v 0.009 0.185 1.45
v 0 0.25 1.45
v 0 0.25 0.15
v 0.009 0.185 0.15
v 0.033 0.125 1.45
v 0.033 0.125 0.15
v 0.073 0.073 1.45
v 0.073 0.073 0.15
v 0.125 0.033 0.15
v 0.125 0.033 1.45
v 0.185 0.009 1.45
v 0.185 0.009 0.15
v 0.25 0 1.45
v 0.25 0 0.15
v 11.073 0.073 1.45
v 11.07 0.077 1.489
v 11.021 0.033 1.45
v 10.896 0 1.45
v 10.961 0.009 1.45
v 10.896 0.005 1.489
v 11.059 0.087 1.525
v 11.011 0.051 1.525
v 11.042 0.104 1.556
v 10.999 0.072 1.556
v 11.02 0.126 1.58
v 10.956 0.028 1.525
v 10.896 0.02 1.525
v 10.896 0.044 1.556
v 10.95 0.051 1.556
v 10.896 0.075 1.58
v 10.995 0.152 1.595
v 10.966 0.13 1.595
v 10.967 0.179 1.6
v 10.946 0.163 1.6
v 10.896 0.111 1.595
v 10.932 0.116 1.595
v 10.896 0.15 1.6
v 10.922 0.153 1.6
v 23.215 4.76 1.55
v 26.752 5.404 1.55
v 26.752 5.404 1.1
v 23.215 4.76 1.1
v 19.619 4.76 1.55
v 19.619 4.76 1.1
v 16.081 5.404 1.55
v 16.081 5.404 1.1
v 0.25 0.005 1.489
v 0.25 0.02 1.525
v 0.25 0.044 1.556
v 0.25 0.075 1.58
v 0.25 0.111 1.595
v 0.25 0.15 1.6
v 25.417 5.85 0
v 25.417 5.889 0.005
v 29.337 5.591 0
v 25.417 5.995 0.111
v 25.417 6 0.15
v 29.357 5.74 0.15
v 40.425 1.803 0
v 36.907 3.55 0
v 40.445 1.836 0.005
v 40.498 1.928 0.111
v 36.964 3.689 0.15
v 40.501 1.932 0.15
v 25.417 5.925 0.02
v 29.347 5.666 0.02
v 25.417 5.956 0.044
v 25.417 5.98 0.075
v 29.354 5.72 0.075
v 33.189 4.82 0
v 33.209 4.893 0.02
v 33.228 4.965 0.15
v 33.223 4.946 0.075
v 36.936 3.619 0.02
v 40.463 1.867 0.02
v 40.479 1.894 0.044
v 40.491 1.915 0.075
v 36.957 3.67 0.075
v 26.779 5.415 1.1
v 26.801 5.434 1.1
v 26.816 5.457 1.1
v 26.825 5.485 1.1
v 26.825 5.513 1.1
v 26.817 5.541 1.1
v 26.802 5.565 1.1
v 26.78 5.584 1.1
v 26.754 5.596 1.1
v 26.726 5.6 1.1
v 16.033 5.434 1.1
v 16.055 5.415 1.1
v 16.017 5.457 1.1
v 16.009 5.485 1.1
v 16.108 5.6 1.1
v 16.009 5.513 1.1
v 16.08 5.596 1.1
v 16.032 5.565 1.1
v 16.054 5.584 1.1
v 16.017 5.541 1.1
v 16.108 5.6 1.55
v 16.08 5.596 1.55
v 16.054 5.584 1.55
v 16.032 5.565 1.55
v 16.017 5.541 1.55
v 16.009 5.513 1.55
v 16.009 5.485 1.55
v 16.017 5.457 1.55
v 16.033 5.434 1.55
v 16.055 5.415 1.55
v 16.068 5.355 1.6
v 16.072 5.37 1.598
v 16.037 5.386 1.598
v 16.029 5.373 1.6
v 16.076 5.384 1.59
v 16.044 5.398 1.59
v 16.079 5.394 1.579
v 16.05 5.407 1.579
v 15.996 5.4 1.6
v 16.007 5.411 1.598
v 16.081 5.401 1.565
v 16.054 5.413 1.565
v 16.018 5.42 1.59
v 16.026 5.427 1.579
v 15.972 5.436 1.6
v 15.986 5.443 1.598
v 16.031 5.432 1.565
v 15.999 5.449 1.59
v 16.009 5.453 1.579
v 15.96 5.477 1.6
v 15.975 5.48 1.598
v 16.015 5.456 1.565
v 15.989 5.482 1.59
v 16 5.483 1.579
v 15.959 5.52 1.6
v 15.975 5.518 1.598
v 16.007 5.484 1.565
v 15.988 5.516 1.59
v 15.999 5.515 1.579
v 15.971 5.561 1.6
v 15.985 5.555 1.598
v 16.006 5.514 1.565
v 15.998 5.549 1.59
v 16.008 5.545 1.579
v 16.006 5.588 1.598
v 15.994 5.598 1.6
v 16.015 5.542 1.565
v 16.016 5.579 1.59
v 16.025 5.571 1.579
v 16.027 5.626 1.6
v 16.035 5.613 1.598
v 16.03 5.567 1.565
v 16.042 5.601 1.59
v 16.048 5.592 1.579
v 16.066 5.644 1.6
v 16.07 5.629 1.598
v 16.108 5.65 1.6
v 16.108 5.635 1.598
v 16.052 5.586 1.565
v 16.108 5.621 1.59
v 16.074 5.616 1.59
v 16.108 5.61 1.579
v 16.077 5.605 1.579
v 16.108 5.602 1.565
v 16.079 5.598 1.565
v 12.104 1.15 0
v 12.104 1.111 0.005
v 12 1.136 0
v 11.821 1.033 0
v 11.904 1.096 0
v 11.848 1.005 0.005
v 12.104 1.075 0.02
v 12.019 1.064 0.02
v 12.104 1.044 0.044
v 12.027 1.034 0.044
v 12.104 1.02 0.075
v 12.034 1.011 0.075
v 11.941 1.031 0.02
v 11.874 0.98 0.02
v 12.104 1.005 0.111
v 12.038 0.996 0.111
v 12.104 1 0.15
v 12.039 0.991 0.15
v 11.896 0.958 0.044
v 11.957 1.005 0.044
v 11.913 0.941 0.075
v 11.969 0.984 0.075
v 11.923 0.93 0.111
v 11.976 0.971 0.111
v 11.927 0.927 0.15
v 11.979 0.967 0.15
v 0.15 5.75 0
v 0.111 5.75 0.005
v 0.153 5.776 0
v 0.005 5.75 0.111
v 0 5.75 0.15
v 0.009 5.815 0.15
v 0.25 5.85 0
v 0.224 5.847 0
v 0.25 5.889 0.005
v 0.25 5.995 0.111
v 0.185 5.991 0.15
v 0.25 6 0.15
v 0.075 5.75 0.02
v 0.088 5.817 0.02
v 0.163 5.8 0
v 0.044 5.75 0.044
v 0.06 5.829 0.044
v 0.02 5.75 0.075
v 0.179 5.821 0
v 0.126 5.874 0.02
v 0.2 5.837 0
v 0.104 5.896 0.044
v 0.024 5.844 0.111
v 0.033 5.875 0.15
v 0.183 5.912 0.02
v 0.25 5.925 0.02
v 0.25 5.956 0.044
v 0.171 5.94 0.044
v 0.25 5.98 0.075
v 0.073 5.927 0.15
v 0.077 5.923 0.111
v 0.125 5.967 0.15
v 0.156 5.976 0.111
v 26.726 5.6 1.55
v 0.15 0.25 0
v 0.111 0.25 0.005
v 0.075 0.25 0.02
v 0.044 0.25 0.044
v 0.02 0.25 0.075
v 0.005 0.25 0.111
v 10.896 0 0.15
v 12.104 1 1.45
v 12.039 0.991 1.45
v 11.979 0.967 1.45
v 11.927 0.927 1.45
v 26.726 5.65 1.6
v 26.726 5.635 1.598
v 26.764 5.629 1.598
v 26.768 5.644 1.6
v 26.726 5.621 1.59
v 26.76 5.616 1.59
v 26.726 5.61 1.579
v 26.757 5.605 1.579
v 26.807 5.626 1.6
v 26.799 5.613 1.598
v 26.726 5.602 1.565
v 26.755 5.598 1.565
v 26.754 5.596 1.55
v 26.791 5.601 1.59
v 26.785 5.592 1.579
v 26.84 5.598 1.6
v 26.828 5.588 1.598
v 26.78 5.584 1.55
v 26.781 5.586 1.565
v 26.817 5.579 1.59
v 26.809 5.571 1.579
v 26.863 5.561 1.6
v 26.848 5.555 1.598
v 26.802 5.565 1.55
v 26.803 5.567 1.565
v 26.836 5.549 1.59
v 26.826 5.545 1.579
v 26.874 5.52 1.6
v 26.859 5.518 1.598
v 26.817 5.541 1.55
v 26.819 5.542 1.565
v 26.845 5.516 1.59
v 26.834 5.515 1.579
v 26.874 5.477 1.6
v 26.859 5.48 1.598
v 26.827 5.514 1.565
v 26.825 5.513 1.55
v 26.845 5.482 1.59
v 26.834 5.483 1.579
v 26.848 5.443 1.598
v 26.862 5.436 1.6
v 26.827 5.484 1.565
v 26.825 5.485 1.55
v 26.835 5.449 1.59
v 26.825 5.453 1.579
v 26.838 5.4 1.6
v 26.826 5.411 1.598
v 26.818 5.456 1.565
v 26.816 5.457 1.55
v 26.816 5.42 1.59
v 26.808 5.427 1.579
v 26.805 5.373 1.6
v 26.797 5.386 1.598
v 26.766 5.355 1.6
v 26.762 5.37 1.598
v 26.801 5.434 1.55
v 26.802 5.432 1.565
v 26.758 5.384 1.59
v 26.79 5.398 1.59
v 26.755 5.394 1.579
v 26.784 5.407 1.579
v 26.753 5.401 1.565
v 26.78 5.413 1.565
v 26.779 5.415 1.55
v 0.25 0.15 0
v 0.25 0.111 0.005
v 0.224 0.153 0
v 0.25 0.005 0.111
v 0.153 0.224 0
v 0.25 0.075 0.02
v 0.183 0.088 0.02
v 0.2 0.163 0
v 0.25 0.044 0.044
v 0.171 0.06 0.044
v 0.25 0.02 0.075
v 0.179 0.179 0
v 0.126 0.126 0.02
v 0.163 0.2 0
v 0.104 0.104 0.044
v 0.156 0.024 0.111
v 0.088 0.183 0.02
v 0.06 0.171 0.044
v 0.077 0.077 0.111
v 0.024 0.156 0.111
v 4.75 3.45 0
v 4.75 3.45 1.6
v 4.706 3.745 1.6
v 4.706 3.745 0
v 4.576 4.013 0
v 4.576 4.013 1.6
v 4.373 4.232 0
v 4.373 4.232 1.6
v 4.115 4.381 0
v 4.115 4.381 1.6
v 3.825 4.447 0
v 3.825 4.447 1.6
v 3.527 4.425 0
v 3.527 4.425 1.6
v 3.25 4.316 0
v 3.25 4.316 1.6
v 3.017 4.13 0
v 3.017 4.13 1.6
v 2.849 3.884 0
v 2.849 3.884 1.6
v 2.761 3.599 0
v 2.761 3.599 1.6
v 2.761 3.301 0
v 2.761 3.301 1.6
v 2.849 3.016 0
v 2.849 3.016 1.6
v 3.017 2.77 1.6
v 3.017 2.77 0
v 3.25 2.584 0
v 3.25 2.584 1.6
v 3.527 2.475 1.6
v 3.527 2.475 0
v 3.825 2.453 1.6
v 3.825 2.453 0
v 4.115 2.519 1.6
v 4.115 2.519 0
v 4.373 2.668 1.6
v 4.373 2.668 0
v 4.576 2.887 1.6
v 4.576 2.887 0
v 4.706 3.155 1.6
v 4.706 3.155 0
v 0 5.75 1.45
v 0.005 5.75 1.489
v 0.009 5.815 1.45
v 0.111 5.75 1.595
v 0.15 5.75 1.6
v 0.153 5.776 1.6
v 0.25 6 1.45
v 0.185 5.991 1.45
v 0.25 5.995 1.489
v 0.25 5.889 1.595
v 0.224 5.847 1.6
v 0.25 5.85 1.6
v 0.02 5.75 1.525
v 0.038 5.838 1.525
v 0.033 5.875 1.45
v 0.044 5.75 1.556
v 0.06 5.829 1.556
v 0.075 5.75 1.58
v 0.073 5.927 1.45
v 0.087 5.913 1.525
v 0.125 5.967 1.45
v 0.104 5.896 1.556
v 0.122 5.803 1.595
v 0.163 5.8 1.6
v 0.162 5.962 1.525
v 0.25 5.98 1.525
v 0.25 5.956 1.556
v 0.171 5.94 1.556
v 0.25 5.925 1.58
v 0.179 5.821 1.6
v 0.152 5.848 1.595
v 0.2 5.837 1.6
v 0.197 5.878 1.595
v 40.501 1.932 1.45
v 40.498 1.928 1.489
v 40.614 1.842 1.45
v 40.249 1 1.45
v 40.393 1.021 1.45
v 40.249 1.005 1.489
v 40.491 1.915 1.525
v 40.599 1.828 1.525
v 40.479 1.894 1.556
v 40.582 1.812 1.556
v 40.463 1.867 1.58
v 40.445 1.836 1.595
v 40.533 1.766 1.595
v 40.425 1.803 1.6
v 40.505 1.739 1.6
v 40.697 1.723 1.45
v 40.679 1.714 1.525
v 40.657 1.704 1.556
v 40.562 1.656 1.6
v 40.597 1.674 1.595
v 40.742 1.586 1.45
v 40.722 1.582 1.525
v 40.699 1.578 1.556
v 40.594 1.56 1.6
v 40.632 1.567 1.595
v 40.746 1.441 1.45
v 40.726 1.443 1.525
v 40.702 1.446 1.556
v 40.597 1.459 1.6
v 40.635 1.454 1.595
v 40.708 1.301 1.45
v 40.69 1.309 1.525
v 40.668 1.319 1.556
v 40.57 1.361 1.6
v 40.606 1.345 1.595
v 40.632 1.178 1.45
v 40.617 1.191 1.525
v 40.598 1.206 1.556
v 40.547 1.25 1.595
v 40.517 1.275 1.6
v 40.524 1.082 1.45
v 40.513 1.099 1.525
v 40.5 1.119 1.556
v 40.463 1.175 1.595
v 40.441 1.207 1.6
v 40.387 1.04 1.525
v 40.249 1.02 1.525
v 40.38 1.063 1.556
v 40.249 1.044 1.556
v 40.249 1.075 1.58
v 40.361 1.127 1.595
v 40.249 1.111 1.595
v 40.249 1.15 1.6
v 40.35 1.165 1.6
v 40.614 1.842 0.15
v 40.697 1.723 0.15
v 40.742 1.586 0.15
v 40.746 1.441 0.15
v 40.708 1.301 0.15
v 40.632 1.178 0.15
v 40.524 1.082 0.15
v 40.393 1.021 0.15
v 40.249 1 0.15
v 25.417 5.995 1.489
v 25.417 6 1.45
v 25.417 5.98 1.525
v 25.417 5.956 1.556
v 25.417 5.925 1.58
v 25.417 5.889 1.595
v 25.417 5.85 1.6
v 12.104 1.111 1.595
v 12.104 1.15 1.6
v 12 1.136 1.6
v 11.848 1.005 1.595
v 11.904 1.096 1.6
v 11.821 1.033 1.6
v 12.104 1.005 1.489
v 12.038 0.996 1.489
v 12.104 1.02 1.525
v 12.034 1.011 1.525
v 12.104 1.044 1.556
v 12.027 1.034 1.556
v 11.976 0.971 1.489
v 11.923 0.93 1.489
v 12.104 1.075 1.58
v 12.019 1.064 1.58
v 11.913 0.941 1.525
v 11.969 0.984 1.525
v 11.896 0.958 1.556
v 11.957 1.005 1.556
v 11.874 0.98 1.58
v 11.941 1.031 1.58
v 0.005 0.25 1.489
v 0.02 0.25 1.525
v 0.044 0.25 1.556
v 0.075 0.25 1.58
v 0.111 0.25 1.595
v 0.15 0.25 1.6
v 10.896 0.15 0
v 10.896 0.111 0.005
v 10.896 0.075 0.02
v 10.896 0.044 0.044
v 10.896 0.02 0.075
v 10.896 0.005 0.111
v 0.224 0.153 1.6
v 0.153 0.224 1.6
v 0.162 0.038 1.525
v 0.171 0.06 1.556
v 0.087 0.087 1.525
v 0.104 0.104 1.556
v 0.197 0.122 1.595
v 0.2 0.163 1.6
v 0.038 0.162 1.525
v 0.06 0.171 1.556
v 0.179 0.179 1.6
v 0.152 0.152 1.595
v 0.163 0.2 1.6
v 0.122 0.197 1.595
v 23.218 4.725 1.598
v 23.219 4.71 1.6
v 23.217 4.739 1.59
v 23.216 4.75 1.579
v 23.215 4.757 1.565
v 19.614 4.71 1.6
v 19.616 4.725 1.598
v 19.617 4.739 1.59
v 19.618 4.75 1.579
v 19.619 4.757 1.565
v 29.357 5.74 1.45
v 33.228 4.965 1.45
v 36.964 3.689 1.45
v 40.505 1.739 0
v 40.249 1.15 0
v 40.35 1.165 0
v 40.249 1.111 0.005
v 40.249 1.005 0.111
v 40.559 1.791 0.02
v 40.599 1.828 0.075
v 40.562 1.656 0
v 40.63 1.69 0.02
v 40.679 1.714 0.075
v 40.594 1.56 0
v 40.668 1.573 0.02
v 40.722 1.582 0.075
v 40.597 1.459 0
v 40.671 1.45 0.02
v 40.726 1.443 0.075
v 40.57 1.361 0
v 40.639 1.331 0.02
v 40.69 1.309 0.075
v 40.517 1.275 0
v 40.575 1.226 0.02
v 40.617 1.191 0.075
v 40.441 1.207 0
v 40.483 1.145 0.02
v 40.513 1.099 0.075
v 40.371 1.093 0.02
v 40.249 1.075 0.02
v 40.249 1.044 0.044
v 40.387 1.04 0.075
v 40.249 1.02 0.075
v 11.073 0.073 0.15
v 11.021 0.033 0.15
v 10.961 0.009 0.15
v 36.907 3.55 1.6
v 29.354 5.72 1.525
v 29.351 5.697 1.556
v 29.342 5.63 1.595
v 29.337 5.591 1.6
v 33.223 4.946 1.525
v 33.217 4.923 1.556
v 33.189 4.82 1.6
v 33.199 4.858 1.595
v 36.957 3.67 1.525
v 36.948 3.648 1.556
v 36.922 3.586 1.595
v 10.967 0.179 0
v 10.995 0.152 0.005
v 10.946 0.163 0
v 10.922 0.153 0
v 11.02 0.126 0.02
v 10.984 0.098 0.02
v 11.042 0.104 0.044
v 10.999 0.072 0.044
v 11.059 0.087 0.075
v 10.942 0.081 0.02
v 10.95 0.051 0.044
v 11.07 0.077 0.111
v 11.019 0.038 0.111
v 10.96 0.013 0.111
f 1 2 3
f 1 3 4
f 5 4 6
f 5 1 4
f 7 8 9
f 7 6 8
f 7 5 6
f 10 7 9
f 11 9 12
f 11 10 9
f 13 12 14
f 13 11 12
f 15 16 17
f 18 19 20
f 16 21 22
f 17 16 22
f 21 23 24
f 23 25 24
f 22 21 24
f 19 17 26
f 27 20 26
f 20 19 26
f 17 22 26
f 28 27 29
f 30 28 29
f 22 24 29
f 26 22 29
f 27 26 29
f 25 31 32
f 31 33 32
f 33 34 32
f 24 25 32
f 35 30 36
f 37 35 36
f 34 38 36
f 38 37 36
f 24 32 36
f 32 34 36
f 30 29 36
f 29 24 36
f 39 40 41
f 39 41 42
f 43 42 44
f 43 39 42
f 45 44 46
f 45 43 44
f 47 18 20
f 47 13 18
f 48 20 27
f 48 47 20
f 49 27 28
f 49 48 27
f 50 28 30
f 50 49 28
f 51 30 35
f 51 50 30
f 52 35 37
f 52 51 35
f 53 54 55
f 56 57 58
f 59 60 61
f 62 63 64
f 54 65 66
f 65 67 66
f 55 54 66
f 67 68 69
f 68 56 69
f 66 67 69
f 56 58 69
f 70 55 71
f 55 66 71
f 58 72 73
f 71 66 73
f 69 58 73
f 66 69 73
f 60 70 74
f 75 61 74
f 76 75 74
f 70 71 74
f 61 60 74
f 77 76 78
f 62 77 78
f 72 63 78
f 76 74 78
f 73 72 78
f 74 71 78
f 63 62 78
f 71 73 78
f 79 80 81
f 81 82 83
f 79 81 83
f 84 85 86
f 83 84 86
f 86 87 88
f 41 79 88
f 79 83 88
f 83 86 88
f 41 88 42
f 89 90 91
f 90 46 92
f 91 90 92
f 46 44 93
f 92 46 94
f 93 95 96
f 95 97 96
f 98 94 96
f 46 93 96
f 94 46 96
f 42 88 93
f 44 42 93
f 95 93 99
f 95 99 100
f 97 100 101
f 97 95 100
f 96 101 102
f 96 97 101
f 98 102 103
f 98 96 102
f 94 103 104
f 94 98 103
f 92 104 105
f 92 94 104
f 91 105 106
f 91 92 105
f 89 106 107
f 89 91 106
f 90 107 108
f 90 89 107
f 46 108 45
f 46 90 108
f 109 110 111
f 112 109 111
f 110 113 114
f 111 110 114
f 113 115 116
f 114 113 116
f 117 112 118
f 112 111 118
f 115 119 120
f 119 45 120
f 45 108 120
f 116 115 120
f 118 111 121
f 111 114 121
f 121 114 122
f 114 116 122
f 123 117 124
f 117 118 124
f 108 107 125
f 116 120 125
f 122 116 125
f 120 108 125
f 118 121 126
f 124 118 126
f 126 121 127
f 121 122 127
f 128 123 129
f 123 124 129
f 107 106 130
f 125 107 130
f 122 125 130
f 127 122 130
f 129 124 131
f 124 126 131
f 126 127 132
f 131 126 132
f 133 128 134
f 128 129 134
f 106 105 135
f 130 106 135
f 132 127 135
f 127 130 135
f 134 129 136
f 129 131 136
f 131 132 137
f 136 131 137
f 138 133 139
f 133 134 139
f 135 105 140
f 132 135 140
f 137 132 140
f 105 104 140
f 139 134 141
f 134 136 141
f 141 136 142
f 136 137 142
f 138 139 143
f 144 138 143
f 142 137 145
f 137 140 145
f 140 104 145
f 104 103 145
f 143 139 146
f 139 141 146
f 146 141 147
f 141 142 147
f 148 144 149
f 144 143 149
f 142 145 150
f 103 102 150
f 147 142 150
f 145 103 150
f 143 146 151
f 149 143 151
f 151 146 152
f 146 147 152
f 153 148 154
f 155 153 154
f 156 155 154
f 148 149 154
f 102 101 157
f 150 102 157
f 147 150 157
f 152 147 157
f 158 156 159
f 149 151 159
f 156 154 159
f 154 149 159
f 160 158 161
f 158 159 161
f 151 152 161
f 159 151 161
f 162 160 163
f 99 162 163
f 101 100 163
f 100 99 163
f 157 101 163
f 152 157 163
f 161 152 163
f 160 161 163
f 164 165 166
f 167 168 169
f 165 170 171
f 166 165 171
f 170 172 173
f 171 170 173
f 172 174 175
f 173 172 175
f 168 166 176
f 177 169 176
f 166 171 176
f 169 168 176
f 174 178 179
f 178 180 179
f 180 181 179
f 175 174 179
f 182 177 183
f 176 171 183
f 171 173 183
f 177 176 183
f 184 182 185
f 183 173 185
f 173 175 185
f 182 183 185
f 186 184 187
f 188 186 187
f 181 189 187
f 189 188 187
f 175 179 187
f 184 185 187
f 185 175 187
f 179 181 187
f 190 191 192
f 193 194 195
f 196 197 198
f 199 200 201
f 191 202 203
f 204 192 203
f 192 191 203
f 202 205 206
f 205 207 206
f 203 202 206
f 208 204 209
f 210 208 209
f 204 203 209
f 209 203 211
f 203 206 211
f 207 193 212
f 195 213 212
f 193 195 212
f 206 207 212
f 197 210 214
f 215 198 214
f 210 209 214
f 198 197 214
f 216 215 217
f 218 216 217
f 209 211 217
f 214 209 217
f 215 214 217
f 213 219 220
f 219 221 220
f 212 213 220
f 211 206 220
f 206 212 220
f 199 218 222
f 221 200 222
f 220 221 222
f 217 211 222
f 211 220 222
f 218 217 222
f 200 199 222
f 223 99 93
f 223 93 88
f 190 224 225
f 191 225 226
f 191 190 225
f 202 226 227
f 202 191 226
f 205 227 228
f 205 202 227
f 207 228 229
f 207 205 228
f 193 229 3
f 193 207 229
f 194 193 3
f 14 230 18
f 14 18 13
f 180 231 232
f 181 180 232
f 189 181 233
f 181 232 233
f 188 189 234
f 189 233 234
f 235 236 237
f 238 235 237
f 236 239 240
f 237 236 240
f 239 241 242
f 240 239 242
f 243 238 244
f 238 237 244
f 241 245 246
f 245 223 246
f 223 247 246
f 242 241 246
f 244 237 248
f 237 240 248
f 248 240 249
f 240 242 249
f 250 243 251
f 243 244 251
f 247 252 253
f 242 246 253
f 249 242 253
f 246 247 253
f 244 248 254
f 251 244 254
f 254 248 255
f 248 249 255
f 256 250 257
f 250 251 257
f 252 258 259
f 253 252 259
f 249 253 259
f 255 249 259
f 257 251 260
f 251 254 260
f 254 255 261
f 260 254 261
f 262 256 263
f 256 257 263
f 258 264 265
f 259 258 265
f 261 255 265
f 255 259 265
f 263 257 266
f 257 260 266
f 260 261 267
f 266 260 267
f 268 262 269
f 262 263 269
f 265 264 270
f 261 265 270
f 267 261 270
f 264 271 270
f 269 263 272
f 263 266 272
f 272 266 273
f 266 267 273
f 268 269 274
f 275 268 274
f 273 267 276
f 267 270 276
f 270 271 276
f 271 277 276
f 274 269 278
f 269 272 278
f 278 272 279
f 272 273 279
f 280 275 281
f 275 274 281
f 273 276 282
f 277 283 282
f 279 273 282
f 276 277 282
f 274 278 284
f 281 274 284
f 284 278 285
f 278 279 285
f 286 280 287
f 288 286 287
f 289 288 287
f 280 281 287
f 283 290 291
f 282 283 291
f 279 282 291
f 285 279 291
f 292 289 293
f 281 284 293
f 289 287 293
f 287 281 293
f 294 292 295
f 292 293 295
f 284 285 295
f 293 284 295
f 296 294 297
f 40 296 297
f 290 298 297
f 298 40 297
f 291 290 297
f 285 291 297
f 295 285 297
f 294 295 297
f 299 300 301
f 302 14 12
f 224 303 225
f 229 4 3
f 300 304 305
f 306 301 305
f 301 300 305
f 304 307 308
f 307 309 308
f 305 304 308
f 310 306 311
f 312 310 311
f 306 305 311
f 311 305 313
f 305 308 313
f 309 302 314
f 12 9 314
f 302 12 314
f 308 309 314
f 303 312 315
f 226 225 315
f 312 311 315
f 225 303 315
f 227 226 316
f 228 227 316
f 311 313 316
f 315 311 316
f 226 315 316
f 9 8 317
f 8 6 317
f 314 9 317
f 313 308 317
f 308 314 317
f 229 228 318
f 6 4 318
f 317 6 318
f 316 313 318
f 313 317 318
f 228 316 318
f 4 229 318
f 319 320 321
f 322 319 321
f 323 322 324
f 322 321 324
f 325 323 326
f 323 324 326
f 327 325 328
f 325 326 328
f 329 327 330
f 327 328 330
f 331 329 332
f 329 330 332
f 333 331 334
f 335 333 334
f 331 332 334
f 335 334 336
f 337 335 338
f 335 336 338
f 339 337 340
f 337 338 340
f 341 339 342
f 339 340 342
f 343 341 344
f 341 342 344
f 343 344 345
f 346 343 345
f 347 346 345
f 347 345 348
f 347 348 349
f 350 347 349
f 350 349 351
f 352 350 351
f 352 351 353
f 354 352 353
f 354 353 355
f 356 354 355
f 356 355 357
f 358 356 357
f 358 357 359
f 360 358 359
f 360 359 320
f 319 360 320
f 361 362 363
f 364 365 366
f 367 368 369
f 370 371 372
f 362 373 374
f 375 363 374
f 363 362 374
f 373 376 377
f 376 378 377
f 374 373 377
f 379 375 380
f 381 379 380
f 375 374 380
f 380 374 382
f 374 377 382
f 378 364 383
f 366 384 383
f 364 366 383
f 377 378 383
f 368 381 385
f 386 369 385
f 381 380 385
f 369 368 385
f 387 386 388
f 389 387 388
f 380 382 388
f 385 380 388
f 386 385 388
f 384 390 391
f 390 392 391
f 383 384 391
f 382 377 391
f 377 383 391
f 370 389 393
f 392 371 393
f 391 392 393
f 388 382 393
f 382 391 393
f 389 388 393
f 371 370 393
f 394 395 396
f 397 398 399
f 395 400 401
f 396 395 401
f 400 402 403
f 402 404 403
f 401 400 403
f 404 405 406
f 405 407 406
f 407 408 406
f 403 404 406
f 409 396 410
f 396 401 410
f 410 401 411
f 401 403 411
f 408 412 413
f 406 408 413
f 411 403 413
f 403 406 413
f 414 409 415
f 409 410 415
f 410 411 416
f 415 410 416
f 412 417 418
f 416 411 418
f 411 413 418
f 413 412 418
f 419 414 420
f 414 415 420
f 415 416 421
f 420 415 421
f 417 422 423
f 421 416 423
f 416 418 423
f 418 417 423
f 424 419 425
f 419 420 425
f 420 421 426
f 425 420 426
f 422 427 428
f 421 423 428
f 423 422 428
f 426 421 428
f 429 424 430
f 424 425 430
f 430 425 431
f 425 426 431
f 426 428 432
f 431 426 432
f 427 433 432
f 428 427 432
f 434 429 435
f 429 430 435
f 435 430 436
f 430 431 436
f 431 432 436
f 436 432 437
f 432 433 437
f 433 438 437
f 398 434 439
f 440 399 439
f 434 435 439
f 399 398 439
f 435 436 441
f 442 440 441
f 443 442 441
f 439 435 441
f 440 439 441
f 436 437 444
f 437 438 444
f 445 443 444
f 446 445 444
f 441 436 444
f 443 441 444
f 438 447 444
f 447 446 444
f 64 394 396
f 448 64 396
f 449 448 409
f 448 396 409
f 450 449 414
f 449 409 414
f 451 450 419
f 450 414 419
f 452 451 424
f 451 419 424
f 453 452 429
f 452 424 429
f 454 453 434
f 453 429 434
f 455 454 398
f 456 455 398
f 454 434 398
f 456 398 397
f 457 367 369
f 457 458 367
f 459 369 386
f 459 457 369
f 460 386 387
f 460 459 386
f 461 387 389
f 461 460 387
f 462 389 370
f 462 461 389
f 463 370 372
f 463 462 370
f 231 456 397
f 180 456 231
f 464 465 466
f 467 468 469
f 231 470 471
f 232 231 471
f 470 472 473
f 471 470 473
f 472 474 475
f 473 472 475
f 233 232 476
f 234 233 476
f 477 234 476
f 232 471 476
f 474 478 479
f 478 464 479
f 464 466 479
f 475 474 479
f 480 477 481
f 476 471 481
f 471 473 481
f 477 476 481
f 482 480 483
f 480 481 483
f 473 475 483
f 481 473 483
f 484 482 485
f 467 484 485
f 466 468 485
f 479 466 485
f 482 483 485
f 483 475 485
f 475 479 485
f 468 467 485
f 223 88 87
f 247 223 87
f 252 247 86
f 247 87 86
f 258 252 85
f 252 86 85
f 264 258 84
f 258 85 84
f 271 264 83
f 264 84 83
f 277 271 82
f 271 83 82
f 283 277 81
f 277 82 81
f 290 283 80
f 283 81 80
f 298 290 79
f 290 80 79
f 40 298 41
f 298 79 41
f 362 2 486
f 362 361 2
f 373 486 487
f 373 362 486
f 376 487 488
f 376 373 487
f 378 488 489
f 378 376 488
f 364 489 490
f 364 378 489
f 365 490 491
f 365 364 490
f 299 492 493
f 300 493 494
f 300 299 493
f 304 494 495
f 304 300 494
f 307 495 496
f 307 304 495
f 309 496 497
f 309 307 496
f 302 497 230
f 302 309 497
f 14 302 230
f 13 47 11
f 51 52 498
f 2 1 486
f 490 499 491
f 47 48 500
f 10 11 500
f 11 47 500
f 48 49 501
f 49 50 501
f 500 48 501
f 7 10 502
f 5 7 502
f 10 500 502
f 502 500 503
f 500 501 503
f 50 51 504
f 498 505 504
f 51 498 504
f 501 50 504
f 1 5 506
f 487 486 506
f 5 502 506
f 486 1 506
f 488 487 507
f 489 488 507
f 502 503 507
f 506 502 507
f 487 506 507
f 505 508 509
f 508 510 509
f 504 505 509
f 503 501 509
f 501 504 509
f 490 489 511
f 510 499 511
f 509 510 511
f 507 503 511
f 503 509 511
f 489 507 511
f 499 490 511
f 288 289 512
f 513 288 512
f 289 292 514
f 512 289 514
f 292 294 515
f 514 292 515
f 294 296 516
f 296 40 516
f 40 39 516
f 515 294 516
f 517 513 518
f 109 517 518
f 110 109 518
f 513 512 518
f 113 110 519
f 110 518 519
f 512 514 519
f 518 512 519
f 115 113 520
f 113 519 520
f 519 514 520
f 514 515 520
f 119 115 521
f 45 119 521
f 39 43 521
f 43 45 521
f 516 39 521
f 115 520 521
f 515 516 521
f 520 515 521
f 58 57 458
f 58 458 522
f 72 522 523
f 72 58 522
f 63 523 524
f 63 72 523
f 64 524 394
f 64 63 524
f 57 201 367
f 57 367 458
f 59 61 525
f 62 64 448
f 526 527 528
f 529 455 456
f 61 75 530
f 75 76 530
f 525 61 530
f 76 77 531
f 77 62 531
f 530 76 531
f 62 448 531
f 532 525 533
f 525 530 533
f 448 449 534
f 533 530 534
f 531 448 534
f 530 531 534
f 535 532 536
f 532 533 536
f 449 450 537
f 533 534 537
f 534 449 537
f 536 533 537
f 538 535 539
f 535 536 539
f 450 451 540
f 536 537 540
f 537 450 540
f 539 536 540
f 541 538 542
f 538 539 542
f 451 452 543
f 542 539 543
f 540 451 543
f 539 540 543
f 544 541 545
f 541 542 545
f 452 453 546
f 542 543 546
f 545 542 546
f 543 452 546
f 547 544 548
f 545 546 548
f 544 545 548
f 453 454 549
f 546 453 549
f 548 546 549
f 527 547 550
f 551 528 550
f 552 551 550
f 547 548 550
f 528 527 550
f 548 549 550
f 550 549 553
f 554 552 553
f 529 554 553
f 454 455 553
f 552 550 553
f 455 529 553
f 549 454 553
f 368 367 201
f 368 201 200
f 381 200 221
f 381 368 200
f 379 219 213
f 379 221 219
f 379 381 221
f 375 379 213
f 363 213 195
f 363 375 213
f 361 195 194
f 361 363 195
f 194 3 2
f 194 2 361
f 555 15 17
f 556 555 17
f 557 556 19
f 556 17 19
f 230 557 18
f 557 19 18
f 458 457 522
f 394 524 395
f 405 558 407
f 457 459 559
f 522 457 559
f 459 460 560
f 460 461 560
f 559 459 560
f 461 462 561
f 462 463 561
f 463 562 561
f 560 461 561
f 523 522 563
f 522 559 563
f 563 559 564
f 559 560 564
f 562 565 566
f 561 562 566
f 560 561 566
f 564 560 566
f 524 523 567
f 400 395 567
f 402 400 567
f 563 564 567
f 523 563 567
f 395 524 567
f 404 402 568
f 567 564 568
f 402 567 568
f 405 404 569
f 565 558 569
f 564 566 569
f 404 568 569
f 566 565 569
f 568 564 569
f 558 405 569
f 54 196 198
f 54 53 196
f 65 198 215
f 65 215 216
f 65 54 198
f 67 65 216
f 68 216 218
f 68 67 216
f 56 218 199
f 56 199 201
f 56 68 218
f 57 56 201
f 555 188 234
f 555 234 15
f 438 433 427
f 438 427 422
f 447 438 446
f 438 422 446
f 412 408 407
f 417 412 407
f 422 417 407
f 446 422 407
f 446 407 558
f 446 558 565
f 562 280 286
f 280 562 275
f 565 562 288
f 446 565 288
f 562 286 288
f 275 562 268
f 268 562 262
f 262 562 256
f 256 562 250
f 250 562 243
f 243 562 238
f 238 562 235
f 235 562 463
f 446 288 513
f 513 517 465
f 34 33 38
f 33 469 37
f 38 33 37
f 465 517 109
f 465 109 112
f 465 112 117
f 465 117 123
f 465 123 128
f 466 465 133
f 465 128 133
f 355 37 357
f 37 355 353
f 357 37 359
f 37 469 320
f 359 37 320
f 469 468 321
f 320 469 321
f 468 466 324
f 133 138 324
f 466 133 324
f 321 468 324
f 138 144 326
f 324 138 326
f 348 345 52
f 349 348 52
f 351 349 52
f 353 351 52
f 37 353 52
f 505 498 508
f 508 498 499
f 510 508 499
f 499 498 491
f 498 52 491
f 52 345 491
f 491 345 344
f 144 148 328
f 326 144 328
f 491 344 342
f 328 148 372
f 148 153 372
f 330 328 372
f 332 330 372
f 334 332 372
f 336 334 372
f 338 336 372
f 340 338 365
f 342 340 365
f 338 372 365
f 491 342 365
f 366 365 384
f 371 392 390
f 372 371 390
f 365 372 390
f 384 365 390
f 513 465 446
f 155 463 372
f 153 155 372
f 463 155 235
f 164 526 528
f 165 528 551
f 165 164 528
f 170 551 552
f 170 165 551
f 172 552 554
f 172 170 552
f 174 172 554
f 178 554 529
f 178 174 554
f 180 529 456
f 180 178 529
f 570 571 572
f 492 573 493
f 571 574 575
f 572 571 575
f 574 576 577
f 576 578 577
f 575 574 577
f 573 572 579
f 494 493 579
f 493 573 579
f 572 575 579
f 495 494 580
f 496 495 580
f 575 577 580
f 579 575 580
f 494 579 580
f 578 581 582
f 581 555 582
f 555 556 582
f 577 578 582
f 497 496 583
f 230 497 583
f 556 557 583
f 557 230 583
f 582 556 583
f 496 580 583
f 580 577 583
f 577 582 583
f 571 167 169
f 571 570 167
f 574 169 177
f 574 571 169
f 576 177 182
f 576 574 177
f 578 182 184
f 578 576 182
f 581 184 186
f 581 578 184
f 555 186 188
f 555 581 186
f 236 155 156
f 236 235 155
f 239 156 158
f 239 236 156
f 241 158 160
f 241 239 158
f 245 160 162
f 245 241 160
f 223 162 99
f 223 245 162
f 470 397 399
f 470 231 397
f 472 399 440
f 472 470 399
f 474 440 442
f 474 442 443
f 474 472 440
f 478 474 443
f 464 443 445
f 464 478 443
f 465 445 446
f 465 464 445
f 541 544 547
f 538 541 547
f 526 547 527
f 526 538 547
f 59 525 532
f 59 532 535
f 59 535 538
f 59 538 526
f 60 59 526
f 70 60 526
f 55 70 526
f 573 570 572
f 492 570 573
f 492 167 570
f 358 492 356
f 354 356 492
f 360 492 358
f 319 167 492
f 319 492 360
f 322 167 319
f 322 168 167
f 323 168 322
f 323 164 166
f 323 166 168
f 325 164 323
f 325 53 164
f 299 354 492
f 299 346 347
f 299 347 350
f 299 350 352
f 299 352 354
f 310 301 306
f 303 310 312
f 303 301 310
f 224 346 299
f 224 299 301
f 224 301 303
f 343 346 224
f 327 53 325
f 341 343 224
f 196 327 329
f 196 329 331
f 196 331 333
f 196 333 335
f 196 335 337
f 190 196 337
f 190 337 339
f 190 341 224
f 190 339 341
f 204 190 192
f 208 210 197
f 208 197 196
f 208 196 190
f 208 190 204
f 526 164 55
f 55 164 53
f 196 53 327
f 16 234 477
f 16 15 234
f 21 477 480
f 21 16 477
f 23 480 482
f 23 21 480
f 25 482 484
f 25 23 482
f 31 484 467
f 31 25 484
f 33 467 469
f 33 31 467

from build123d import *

# Parameters (mm, degrees)
BOSS_EXTRUDE1_DEPTH = 1.6
FILLET1_R           = 0.5
FILLET2_R           = 0.25
FILLET3_R           = 0.15
SKETCH2_R           = 1
CUT_EXTRUDE1_DEPTH  = 42.21969505
CUT_EXTRUDE2_DEPTH  = 0.5
FILLET4_R           = 0.1
FILLET5_R           = 0.05


with BuildPart() as part:
    # Sketch1 → Boss-Extrude1 (new body)
    with BuildSketch(Plane.XY):
        with BuildLine():
            Line((0, 0), (0, 6))
            Line((0, 6), (25.416876048, 6))
            ThreePointArc((25.416876048, 6), (34.077130086, 4.722813233), (42, 1))
            Line((42, 1), (12, 1))
            Line((12, 1), (11, 0))
            Line((11, 0), (0, 0))
        make_face()
    extrude(amount=BOSS_EXTRUDE1_DEPTH)

    # Fillet1
    fillet1_edges = [part.edges().sort_by_distance(p)[0] for p in [
        (42, 1, 0.8),
    ]]
    fillet(fillet1_edges, radius=FILLET1_R)

    # Fillet2
    fillet2_edges = [part.edges().sort_by_distance(p)[0] for p in [
        (0, 0, 0.8),
        (0, 6, 0.8),
        (12, 1, 0.8),
        (11, 0, 0.8),
    ]]
    fillet(fillet2_edges, radius=FILLET2_R)

    # Fillet3
    fillet3_edges = [part.edges().sort_by_distance(p)[0] for p in [
        (33.228210707, 4.96520414, 0),
        (33.228210707, 4.96520414, 1.6),
        (12.833438024, 6, 1.6),
        (40.732026425, 1.369811089, 0),
        (40.732026425, 1.369811089, 1.6),
        (0, 3, 0),
        (0, 3, 1.6),
        (26.176413207, 1, 0),
        (11.5, 0.5, 0),
        (5.573223305, 0, 0),
        (0.073223305, 0.073223305, 0),
        (10.992117467, 0.019030117, 0),
        (0.073223305, 5.926776695, 0),
        (26.176413207, 1, 1.6),
        (5.573223305, 0, 1.6),
        (11.5, 0.5, 1.6),
        (0.073223305, 0.073223305, 1.6),
        (10.992117467, 0.019030117, 1.6),
        (0.073223305, 5.926776695, 1.6),
        (12.007882533, 0.980969883, 0),
        (12.007882533, 0.980969883, 1.6),
        (12.833438024, 6, 0),
    ]]
    fillet(fillet3_edges, radius=FILLET3_R)

    # Sketch2 → Cut-Extrude1 (cut, through all)
    with BuildSketch(Plane.XY.offset(1.6)):
        with Locations((3.75, 3.45)):
            Circle(SKETCH2_R)
    extrude(amount=-CUT_EXTRUDE1_DEPTH, mode=Mode.SUBTRACT)

    # Sketch3 → Cut-Extrude2 (cut)
    with BuildSketch(Plane.XY.offset(1.6)):
        with BuildLine():
            Line((15.416876048, 5.6), (27.416876048, 5.6))
            ThreePointArc((27.416876048, 5.6), (21.416876048, 4.678784028), (15.416876048, 5.6))
        make_face()
    extrude(amount=-CUT_EXTRUDE2_DEPTH, mode=Mode.SUBTRACT)

    # Fillet4
    fillet4_edges = [part.edges().sort_by_distance(p)[0] for p in [
        (27.416876048, 5.6, 1.35),
        (15.416876048, 5.6, 1.35),
    ]]
    fillet(fillet4_edges, radius=FILLET4_R)

    # Fillet5
    fillet5_edges = [part.edges().sort_by_distance(p)[0] for p in [
        (21.416876048, 5.6, 1.6),
        (21.416876048, 4.678784028, 1.6),
        (26.824849278, 5.513461428, 1.6),
        (16.008902818, 5.513461428, 1.6),
    ]]
    fillet(fillet5_edges, radius=FILLET5_R)


solid = part.part
